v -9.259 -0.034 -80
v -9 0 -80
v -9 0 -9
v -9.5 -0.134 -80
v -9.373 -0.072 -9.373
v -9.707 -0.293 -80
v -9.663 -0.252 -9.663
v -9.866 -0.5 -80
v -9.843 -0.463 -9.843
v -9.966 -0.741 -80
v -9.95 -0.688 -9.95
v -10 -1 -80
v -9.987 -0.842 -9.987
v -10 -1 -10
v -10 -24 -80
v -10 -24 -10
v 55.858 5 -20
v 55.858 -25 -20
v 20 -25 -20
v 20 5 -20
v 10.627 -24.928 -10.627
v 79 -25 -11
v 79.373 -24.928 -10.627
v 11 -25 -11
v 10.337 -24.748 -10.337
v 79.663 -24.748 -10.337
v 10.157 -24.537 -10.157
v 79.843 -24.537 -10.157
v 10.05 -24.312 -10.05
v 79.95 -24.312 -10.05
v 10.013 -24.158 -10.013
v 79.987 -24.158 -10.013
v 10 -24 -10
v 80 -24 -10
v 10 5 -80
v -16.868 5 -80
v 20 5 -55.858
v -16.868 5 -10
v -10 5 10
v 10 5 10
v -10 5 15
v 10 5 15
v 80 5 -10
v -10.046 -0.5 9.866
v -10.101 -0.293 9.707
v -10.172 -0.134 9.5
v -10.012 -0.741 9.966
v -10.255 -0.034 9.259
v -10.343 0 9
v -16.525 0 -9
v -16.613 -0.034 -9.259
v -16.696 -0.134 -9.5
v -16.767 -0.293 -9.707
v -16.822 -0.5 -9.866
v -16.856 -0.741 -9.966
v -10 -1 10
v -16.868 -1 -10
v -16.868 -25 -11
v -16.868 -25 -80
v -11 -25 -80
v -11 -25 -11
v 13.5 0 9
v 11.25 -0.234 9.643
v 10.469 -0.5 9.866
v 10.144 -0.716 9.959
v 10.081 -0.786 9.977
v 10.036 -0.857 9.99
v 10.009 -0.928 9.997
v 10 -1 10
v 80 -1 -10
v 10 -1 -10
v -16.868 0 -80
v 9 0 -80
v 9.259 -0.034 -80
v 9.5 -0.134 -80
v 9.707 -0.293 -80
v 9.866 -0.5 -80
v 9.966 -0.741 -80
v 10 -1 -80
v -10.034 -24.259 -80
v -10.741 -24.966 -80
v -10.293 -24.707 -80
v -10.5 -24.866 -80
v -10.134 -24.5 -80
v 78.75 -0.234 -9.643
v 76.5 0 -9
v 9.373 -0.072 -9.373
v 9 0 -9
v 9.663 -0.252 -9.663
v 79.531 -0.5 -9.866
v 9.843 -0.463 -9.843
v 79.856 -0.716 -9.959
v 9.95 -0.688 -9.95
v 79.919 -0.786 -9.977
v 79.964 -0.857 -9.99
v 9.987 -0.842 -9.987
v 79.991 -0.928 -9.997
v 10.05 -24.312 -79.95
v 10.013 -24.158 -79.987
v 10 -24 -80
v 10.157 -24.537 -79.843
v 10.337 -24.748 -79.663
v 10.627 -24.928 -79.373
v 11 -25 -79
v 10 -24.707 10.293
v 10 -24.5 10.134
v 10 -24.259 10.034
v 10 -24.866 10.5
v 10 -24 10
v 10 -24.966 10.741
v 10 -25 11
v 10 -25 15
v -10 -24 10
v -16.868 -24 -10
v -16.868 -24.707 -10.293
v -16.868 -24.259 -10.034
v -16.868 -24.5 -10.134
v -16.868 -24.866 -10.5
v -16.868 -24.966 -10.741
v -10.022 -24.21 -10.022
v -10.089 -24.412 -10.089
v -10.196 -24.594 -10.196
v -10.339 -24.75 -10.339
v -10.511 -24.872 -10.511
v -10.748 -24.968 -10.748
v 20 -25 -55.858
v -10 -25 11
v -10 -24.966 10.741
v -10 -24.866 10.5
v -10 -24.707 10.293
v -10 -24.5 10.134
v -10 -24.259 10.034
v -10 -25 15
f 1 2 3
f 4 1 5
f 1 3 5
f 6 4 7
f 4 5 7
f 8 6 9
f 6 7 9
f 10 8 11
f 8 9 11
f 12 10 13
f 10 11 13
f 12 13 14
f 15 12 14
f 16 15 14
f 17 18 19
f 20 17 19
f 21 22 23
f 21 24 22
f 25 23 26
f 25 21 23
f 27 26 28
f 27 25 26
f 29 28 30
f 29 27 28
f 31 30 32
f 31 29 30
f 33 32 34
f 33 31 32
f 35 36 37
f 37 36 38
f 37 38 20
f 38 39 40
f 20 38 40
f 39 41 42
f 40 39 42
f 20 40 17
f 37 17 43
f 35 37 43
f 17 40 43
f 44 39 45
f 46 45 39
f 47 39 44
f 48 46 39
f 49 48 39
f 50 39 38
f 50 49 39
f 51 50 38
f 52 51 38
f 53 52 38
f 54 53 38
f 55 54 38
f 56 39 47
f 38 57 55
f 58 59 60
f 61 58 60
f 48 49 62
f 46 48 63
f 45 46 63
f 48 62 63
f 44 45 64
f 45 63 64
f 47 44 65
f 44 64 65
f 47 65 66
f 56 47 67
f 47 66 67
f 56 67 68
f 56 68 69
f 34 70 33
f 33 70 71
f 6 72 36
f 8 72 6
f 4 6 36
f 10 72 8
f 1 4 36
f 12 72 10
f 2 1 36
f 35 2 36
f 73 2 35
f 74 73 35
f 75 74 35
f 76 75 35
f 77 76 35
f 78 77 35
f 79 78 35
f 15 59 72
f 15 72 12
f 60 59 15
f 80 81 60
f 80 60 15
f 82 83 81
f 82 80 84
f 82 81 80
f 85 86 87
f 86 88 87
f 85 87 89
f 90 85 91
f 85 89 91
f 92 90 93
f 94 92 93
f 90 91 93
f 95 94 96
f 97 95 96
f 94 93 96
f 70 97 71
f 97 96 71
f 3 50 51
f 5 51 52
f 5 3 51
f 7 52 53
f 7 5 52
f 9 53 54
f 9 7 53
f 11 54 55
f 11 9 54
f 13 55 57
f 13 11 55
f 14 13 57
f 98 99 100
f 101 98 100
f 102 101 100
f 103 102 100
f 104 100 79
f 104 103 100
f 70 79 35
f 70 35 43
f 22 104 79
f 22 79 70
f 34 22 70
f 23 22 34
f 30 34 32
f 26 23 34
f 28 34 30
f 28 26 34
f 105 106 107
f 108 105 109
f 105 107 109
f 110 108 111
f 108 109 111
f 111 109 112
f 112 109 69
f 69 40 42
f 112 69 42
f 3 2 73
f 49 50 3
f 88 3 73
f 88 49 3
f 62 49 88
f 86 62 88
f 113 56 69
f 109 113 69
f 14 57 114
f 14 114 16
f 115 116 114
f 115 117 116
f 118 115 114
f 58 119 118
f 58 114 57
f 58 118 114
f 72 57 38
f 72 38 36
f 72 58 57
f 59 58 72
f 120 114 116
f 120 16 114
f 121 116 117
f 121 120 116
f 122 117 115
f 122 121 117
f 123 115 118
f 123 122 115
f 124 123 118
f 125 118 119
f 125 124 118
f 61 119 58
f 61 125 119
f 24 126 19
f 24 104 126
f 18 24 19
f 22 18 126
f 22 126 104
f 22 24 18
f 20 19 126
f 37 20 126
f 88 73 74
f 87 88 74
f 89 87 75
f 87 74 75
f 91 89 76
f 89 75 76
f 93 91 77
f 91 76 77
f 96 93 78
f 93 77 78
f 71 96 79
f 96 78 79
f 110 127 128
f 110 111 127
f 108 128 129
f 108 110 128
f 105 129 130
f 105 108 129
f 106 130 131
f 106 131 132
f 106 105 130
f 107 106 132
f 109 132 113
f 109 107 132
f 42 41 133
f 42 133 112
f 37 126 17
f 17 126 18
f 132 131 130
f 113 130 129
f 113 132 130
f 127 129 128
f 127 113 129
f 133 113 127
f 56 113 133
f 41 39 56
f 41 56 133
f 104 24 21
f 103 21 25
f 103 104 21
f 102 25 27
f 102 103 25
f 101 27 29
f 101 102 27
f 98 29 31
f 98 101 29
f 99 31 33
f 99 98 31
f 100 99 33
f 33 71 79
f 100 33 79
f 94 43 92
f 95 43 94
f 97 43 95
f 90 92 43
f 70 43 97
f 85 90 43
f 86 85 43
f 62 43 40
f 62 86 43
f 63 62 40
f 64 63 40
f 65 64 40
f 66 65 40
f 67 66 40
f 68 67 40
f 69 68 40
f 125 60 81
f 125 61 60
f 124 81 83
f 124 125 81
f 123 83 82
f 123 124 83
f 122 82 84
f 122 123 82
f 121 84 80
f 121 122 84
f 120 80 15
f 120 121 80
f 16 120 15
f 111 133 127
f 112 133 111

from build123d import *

# Parameters (mm, degrees)
F1_DEPTH = 5
F2_W     = 20
F2_H     = 5
F2_W_2   = 6.8679952621
F2_H_2   = 70
F3_DEPTH = 25
F4_R     = 1
F6_DEPTH = 30.001


with BuildPart() as f1:
    # F0 (on Front) → F1 (new body)
    with BuildSketch(Plane.XZ):
        Polygon((10, 15), (0, 15), (-10, 15), (-10, 10), (-16.8679952621, -10), (-16.8679952621, -80), (0, -80), (10, -80), (80, -10), (10, 10), align=None)
    extrude(amount=-F1_DEPTH)

    # F2 (on face) → F3 (join)
    with BuildSketch(Plane.XZ):
        with Locations((0, 12.5)):
            Rectangle(F2_W, F2_H)
        Polygon((10, -80), (80, -10), (10, -10), align=None)
        with Locations((-13.4339976311, -45)):
            Rectangle(F2_W_2, F2_H_2)
    extrude(amount=F3_DEPTH)

    # F4
    f4_edges = [f1.edges().sort_by_distance(p)[0] for p in [
        (0, 0, 10),
        (-13.433998, 0, -10),
        (45, 0, -10),
        (10, 0, -45),
        (-10, 0, -45),
        (0, -25, 10),
        (45, -25, -10),
        (10, -25, -45),
        (-13.433998, -25, -10),
        (-10, -25, -45),
    ]]
    fillet(f4_edges, radius=F4_R)

    # F5 (on face) → F6 (cut, through all)
    with BuildSketch(Plane.XZ.offset(25)):
        Polygon((55.8578643763, -20), (20, -20), (20, -55.8578643763), align=None)
    extrude(amount=-F6_DEPTH, mode=Mode.SUBTRACT)


solid = f1.part
